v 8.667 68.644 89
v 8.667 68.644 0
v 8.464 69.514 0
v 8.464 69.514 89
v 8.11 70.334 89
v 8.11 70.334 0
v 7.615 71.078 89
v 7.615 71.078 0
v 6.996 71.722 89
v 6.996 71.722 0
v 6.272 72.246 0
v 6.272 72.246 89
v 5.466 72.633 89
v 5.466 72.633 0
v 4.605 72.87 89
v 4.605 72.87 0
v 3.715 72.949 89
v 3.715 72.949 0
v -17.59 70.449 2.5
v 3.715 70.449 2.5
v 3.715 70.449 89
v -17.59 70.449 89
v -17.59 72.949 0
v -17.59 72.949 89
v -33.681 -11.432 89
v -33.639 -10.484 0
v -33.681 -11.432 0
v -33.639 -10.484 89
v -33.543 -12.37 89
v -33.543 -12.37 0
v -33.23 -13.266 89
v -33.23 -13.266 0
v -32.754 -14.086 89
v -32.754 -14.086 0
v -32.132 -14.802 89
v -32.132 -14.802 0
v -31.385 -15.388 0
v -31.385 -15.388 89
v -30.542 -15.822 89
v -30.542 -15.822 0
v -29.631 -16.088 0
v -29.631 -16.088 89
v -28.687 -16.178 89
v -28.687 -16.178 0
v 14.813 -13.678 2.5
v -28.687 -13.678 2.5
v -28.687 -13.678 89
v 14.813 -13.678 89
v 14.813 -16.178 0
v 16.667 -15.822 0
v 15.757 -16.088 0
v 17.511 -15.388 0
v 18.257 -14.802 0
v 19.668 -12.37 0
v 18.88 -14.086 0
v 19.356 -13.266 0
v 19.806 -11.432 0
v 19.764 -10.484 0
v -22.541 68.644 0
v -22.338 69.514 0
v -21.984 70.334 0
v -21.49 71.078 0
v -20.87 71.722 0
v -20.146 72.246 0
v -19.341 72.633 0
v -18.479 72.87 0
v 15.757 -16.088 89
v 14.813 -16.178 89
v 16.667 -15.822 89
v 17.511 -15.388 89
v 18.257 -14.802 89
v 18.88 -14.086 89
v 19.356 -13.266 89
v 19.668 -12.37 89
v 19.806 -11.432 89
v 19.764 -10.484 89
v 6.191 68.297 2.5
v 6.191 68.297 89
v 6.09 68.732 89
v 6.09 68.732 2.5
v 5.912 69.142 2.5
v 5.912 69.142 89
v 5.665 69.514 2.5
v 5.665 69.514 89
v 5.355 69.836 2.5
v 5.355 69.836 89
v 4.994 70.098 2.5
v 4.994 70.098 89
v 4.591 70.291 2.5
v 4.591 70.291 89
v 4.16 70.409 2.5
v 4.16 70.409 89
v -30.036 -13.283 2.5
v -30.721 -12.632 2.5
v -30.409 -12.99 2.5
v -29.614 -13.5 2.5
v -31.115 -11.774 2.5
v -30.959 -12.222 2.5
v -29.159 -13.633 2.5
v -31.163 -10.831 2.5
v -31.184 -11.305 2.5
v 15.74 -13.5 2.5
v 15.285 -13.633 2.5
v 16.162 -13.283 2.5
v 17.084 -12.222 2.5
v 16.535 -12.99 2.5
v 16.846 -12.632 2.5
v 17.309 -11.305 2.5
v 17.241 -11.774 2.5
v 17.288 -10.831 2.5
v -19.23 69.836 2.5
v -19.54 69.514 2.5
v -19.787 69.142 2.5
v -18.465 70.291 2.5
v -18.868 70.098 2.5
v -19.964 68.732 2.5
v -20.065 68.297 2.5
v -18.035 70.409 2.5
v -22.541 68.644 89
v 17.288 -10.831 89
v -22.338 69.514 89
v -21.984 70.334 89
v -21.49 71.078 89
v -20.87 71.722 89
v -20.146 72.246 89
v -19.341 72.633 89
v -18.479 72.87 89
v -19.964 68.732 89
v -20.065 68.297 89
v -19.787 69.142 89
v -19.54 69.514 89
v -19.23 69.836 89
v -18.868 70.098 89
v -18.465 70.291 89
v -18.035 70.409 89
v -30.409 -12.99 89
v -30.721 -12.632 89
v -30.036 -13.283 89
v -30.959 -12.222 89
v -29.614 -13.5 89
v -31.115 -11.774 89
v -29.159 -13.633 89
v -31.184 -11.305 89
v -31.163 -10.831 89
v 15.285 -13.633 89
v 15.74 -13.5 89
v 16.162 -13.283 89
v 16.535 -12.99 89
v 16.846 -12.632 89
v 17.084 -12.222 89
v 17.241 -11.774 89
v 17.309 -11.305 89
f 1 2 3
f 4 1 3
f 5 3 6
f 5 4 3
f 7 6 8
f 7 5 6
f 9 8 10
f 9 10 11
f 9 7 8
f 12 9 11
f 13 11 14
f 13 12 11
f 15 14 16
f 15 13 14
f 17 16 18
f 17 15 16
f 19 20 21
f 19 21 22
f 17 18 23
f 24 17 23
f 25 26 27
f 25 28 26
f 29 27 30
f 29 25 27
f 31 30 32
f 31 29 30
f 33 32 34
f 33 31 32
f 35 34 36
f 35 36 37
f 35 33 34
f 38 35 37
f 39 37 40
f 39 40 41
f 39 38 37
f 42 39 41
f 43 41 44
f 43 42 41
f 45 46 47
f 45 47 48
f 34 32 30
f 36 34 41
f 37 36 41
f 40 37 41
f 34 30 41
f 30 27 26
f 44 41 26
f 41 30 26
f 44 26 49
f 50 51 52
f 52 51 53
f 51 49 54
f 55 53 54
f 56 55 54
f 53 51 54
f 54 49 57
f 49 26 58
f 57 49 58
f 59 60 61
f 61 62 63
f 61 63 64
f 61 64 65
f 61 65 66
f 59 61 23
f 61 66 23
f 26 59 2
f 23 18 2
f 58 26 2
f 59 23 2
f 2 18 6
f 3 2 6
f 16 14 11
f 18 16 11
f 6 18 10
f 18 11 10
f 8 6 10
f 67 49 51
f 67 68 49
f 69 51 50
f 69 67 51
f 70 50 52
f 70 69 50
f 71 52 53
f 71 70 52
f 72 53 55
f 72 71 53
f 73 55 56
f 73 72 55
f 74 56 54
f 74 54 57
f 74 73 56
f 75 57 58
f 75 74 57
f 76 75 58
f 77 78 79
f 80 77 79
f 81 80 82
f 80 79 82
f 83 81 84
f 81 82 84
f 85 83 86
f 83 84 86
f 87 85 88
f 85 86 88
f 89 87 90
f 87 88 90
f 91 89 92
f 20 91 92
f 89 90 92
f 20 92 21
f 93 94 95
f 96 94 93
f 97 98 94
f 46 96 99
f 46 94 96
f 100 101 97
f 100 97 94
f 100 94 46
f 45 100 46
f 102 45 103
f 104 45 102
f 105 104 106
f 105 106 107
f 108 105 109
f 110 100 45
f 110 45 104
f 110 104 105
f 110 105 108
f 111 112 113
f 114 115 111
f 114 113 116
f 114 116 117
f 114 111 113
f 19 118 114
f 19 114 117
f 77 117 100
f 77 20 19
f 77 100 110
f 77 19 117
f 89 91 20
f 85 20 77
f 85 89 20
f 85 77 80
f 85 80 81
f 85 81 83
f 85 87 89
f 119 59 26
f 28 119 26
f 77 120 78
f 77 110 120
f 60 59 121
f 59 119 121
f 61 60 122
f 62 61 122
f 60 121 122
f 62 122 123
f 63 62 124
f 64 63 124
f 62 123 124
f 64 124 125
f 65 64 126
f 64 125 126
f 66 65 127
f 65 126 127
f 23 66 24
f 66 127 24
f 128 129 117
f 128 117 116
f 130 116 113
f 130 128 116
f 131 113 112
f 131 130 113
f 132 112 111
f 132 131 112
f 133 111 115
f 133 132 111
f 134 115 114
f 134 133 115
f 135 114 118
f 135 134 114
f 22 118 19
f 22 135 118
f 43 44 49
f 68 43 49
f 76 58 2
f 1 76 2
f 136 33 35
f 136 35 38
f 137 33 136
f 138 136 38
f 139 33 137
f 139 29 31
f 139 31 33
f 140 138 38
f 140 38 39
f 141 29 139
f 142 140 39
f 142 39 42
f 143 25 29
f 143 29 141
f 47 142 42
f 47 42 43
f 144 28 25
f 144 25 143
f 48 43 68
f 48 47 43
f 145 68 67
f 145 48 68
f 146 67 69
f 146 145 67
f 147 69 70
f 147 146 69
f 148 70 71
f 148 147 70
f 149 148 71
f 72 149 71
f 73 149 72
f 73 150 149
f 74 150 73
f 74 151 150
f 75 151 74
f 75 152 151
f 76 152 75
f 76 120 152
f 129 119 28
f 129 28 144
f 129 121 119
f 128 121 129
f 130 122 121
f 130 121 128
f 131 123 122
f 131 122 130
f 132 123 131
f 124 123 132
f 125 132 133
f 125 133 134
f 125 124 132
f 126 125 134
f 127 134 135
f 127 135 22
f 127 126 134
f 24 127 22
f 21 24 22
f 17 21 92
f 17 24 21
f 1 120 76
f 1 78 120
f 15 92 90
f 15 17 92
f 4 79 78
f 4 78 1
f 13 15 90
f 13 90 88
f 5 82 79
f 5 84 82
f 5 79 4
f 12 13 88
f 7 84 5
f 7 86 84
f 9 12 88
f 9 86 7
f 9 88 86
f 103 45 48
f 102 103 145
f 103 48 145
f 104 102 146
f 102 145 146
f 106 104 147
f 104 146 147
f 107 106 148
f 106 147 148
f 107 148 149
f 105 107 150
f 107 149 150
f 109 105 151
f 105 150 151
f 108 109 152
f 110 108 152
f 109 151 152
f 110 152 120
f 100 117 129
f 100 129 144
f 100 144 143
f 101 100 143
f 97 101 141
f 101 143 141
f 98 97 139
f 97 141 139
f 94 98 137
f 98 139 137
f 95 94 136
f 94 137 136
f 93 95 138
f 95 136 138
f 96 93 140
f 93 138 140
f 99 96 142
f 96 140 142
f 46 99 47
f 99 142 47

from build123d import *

# Parameters (mm, degrees)
F1_DEPTH = 89
F2_R     = 5
F3_T     = -2.5


with BuildPart() as f1:
    # F0 (on Top) → F1 (new body)
    with BuildSketch(Plane.XY):
        Polygon((-21.937249, 72.949414), (-34.437249, -16.178304), (20.562751, -16.178304), (8.062751, 72.949414), align=None)
    extrude(amount=F1_DEPTH)

    # F2
    f2_edges = [f1.edges().sort_by_distance(p)[0] for p in [
        (-34.437249, -16.178304, 44.5),
        (20.562751, -16.178304, 44.5),
        (8.062751, 72.949414, 44.5),
        (-21.937249, 72.949414, 44.5),
    ]]
    fillet(f2_edges, radius=F2_R)

    # F3
    f3_openings = [f1.faces().sort_by_distance(p)[0] for p in [
        (-6.937249, 24.070878, 89),
    ]]
    offset(amount=F3_T, openings=f3_openings)


solid = f1.part
